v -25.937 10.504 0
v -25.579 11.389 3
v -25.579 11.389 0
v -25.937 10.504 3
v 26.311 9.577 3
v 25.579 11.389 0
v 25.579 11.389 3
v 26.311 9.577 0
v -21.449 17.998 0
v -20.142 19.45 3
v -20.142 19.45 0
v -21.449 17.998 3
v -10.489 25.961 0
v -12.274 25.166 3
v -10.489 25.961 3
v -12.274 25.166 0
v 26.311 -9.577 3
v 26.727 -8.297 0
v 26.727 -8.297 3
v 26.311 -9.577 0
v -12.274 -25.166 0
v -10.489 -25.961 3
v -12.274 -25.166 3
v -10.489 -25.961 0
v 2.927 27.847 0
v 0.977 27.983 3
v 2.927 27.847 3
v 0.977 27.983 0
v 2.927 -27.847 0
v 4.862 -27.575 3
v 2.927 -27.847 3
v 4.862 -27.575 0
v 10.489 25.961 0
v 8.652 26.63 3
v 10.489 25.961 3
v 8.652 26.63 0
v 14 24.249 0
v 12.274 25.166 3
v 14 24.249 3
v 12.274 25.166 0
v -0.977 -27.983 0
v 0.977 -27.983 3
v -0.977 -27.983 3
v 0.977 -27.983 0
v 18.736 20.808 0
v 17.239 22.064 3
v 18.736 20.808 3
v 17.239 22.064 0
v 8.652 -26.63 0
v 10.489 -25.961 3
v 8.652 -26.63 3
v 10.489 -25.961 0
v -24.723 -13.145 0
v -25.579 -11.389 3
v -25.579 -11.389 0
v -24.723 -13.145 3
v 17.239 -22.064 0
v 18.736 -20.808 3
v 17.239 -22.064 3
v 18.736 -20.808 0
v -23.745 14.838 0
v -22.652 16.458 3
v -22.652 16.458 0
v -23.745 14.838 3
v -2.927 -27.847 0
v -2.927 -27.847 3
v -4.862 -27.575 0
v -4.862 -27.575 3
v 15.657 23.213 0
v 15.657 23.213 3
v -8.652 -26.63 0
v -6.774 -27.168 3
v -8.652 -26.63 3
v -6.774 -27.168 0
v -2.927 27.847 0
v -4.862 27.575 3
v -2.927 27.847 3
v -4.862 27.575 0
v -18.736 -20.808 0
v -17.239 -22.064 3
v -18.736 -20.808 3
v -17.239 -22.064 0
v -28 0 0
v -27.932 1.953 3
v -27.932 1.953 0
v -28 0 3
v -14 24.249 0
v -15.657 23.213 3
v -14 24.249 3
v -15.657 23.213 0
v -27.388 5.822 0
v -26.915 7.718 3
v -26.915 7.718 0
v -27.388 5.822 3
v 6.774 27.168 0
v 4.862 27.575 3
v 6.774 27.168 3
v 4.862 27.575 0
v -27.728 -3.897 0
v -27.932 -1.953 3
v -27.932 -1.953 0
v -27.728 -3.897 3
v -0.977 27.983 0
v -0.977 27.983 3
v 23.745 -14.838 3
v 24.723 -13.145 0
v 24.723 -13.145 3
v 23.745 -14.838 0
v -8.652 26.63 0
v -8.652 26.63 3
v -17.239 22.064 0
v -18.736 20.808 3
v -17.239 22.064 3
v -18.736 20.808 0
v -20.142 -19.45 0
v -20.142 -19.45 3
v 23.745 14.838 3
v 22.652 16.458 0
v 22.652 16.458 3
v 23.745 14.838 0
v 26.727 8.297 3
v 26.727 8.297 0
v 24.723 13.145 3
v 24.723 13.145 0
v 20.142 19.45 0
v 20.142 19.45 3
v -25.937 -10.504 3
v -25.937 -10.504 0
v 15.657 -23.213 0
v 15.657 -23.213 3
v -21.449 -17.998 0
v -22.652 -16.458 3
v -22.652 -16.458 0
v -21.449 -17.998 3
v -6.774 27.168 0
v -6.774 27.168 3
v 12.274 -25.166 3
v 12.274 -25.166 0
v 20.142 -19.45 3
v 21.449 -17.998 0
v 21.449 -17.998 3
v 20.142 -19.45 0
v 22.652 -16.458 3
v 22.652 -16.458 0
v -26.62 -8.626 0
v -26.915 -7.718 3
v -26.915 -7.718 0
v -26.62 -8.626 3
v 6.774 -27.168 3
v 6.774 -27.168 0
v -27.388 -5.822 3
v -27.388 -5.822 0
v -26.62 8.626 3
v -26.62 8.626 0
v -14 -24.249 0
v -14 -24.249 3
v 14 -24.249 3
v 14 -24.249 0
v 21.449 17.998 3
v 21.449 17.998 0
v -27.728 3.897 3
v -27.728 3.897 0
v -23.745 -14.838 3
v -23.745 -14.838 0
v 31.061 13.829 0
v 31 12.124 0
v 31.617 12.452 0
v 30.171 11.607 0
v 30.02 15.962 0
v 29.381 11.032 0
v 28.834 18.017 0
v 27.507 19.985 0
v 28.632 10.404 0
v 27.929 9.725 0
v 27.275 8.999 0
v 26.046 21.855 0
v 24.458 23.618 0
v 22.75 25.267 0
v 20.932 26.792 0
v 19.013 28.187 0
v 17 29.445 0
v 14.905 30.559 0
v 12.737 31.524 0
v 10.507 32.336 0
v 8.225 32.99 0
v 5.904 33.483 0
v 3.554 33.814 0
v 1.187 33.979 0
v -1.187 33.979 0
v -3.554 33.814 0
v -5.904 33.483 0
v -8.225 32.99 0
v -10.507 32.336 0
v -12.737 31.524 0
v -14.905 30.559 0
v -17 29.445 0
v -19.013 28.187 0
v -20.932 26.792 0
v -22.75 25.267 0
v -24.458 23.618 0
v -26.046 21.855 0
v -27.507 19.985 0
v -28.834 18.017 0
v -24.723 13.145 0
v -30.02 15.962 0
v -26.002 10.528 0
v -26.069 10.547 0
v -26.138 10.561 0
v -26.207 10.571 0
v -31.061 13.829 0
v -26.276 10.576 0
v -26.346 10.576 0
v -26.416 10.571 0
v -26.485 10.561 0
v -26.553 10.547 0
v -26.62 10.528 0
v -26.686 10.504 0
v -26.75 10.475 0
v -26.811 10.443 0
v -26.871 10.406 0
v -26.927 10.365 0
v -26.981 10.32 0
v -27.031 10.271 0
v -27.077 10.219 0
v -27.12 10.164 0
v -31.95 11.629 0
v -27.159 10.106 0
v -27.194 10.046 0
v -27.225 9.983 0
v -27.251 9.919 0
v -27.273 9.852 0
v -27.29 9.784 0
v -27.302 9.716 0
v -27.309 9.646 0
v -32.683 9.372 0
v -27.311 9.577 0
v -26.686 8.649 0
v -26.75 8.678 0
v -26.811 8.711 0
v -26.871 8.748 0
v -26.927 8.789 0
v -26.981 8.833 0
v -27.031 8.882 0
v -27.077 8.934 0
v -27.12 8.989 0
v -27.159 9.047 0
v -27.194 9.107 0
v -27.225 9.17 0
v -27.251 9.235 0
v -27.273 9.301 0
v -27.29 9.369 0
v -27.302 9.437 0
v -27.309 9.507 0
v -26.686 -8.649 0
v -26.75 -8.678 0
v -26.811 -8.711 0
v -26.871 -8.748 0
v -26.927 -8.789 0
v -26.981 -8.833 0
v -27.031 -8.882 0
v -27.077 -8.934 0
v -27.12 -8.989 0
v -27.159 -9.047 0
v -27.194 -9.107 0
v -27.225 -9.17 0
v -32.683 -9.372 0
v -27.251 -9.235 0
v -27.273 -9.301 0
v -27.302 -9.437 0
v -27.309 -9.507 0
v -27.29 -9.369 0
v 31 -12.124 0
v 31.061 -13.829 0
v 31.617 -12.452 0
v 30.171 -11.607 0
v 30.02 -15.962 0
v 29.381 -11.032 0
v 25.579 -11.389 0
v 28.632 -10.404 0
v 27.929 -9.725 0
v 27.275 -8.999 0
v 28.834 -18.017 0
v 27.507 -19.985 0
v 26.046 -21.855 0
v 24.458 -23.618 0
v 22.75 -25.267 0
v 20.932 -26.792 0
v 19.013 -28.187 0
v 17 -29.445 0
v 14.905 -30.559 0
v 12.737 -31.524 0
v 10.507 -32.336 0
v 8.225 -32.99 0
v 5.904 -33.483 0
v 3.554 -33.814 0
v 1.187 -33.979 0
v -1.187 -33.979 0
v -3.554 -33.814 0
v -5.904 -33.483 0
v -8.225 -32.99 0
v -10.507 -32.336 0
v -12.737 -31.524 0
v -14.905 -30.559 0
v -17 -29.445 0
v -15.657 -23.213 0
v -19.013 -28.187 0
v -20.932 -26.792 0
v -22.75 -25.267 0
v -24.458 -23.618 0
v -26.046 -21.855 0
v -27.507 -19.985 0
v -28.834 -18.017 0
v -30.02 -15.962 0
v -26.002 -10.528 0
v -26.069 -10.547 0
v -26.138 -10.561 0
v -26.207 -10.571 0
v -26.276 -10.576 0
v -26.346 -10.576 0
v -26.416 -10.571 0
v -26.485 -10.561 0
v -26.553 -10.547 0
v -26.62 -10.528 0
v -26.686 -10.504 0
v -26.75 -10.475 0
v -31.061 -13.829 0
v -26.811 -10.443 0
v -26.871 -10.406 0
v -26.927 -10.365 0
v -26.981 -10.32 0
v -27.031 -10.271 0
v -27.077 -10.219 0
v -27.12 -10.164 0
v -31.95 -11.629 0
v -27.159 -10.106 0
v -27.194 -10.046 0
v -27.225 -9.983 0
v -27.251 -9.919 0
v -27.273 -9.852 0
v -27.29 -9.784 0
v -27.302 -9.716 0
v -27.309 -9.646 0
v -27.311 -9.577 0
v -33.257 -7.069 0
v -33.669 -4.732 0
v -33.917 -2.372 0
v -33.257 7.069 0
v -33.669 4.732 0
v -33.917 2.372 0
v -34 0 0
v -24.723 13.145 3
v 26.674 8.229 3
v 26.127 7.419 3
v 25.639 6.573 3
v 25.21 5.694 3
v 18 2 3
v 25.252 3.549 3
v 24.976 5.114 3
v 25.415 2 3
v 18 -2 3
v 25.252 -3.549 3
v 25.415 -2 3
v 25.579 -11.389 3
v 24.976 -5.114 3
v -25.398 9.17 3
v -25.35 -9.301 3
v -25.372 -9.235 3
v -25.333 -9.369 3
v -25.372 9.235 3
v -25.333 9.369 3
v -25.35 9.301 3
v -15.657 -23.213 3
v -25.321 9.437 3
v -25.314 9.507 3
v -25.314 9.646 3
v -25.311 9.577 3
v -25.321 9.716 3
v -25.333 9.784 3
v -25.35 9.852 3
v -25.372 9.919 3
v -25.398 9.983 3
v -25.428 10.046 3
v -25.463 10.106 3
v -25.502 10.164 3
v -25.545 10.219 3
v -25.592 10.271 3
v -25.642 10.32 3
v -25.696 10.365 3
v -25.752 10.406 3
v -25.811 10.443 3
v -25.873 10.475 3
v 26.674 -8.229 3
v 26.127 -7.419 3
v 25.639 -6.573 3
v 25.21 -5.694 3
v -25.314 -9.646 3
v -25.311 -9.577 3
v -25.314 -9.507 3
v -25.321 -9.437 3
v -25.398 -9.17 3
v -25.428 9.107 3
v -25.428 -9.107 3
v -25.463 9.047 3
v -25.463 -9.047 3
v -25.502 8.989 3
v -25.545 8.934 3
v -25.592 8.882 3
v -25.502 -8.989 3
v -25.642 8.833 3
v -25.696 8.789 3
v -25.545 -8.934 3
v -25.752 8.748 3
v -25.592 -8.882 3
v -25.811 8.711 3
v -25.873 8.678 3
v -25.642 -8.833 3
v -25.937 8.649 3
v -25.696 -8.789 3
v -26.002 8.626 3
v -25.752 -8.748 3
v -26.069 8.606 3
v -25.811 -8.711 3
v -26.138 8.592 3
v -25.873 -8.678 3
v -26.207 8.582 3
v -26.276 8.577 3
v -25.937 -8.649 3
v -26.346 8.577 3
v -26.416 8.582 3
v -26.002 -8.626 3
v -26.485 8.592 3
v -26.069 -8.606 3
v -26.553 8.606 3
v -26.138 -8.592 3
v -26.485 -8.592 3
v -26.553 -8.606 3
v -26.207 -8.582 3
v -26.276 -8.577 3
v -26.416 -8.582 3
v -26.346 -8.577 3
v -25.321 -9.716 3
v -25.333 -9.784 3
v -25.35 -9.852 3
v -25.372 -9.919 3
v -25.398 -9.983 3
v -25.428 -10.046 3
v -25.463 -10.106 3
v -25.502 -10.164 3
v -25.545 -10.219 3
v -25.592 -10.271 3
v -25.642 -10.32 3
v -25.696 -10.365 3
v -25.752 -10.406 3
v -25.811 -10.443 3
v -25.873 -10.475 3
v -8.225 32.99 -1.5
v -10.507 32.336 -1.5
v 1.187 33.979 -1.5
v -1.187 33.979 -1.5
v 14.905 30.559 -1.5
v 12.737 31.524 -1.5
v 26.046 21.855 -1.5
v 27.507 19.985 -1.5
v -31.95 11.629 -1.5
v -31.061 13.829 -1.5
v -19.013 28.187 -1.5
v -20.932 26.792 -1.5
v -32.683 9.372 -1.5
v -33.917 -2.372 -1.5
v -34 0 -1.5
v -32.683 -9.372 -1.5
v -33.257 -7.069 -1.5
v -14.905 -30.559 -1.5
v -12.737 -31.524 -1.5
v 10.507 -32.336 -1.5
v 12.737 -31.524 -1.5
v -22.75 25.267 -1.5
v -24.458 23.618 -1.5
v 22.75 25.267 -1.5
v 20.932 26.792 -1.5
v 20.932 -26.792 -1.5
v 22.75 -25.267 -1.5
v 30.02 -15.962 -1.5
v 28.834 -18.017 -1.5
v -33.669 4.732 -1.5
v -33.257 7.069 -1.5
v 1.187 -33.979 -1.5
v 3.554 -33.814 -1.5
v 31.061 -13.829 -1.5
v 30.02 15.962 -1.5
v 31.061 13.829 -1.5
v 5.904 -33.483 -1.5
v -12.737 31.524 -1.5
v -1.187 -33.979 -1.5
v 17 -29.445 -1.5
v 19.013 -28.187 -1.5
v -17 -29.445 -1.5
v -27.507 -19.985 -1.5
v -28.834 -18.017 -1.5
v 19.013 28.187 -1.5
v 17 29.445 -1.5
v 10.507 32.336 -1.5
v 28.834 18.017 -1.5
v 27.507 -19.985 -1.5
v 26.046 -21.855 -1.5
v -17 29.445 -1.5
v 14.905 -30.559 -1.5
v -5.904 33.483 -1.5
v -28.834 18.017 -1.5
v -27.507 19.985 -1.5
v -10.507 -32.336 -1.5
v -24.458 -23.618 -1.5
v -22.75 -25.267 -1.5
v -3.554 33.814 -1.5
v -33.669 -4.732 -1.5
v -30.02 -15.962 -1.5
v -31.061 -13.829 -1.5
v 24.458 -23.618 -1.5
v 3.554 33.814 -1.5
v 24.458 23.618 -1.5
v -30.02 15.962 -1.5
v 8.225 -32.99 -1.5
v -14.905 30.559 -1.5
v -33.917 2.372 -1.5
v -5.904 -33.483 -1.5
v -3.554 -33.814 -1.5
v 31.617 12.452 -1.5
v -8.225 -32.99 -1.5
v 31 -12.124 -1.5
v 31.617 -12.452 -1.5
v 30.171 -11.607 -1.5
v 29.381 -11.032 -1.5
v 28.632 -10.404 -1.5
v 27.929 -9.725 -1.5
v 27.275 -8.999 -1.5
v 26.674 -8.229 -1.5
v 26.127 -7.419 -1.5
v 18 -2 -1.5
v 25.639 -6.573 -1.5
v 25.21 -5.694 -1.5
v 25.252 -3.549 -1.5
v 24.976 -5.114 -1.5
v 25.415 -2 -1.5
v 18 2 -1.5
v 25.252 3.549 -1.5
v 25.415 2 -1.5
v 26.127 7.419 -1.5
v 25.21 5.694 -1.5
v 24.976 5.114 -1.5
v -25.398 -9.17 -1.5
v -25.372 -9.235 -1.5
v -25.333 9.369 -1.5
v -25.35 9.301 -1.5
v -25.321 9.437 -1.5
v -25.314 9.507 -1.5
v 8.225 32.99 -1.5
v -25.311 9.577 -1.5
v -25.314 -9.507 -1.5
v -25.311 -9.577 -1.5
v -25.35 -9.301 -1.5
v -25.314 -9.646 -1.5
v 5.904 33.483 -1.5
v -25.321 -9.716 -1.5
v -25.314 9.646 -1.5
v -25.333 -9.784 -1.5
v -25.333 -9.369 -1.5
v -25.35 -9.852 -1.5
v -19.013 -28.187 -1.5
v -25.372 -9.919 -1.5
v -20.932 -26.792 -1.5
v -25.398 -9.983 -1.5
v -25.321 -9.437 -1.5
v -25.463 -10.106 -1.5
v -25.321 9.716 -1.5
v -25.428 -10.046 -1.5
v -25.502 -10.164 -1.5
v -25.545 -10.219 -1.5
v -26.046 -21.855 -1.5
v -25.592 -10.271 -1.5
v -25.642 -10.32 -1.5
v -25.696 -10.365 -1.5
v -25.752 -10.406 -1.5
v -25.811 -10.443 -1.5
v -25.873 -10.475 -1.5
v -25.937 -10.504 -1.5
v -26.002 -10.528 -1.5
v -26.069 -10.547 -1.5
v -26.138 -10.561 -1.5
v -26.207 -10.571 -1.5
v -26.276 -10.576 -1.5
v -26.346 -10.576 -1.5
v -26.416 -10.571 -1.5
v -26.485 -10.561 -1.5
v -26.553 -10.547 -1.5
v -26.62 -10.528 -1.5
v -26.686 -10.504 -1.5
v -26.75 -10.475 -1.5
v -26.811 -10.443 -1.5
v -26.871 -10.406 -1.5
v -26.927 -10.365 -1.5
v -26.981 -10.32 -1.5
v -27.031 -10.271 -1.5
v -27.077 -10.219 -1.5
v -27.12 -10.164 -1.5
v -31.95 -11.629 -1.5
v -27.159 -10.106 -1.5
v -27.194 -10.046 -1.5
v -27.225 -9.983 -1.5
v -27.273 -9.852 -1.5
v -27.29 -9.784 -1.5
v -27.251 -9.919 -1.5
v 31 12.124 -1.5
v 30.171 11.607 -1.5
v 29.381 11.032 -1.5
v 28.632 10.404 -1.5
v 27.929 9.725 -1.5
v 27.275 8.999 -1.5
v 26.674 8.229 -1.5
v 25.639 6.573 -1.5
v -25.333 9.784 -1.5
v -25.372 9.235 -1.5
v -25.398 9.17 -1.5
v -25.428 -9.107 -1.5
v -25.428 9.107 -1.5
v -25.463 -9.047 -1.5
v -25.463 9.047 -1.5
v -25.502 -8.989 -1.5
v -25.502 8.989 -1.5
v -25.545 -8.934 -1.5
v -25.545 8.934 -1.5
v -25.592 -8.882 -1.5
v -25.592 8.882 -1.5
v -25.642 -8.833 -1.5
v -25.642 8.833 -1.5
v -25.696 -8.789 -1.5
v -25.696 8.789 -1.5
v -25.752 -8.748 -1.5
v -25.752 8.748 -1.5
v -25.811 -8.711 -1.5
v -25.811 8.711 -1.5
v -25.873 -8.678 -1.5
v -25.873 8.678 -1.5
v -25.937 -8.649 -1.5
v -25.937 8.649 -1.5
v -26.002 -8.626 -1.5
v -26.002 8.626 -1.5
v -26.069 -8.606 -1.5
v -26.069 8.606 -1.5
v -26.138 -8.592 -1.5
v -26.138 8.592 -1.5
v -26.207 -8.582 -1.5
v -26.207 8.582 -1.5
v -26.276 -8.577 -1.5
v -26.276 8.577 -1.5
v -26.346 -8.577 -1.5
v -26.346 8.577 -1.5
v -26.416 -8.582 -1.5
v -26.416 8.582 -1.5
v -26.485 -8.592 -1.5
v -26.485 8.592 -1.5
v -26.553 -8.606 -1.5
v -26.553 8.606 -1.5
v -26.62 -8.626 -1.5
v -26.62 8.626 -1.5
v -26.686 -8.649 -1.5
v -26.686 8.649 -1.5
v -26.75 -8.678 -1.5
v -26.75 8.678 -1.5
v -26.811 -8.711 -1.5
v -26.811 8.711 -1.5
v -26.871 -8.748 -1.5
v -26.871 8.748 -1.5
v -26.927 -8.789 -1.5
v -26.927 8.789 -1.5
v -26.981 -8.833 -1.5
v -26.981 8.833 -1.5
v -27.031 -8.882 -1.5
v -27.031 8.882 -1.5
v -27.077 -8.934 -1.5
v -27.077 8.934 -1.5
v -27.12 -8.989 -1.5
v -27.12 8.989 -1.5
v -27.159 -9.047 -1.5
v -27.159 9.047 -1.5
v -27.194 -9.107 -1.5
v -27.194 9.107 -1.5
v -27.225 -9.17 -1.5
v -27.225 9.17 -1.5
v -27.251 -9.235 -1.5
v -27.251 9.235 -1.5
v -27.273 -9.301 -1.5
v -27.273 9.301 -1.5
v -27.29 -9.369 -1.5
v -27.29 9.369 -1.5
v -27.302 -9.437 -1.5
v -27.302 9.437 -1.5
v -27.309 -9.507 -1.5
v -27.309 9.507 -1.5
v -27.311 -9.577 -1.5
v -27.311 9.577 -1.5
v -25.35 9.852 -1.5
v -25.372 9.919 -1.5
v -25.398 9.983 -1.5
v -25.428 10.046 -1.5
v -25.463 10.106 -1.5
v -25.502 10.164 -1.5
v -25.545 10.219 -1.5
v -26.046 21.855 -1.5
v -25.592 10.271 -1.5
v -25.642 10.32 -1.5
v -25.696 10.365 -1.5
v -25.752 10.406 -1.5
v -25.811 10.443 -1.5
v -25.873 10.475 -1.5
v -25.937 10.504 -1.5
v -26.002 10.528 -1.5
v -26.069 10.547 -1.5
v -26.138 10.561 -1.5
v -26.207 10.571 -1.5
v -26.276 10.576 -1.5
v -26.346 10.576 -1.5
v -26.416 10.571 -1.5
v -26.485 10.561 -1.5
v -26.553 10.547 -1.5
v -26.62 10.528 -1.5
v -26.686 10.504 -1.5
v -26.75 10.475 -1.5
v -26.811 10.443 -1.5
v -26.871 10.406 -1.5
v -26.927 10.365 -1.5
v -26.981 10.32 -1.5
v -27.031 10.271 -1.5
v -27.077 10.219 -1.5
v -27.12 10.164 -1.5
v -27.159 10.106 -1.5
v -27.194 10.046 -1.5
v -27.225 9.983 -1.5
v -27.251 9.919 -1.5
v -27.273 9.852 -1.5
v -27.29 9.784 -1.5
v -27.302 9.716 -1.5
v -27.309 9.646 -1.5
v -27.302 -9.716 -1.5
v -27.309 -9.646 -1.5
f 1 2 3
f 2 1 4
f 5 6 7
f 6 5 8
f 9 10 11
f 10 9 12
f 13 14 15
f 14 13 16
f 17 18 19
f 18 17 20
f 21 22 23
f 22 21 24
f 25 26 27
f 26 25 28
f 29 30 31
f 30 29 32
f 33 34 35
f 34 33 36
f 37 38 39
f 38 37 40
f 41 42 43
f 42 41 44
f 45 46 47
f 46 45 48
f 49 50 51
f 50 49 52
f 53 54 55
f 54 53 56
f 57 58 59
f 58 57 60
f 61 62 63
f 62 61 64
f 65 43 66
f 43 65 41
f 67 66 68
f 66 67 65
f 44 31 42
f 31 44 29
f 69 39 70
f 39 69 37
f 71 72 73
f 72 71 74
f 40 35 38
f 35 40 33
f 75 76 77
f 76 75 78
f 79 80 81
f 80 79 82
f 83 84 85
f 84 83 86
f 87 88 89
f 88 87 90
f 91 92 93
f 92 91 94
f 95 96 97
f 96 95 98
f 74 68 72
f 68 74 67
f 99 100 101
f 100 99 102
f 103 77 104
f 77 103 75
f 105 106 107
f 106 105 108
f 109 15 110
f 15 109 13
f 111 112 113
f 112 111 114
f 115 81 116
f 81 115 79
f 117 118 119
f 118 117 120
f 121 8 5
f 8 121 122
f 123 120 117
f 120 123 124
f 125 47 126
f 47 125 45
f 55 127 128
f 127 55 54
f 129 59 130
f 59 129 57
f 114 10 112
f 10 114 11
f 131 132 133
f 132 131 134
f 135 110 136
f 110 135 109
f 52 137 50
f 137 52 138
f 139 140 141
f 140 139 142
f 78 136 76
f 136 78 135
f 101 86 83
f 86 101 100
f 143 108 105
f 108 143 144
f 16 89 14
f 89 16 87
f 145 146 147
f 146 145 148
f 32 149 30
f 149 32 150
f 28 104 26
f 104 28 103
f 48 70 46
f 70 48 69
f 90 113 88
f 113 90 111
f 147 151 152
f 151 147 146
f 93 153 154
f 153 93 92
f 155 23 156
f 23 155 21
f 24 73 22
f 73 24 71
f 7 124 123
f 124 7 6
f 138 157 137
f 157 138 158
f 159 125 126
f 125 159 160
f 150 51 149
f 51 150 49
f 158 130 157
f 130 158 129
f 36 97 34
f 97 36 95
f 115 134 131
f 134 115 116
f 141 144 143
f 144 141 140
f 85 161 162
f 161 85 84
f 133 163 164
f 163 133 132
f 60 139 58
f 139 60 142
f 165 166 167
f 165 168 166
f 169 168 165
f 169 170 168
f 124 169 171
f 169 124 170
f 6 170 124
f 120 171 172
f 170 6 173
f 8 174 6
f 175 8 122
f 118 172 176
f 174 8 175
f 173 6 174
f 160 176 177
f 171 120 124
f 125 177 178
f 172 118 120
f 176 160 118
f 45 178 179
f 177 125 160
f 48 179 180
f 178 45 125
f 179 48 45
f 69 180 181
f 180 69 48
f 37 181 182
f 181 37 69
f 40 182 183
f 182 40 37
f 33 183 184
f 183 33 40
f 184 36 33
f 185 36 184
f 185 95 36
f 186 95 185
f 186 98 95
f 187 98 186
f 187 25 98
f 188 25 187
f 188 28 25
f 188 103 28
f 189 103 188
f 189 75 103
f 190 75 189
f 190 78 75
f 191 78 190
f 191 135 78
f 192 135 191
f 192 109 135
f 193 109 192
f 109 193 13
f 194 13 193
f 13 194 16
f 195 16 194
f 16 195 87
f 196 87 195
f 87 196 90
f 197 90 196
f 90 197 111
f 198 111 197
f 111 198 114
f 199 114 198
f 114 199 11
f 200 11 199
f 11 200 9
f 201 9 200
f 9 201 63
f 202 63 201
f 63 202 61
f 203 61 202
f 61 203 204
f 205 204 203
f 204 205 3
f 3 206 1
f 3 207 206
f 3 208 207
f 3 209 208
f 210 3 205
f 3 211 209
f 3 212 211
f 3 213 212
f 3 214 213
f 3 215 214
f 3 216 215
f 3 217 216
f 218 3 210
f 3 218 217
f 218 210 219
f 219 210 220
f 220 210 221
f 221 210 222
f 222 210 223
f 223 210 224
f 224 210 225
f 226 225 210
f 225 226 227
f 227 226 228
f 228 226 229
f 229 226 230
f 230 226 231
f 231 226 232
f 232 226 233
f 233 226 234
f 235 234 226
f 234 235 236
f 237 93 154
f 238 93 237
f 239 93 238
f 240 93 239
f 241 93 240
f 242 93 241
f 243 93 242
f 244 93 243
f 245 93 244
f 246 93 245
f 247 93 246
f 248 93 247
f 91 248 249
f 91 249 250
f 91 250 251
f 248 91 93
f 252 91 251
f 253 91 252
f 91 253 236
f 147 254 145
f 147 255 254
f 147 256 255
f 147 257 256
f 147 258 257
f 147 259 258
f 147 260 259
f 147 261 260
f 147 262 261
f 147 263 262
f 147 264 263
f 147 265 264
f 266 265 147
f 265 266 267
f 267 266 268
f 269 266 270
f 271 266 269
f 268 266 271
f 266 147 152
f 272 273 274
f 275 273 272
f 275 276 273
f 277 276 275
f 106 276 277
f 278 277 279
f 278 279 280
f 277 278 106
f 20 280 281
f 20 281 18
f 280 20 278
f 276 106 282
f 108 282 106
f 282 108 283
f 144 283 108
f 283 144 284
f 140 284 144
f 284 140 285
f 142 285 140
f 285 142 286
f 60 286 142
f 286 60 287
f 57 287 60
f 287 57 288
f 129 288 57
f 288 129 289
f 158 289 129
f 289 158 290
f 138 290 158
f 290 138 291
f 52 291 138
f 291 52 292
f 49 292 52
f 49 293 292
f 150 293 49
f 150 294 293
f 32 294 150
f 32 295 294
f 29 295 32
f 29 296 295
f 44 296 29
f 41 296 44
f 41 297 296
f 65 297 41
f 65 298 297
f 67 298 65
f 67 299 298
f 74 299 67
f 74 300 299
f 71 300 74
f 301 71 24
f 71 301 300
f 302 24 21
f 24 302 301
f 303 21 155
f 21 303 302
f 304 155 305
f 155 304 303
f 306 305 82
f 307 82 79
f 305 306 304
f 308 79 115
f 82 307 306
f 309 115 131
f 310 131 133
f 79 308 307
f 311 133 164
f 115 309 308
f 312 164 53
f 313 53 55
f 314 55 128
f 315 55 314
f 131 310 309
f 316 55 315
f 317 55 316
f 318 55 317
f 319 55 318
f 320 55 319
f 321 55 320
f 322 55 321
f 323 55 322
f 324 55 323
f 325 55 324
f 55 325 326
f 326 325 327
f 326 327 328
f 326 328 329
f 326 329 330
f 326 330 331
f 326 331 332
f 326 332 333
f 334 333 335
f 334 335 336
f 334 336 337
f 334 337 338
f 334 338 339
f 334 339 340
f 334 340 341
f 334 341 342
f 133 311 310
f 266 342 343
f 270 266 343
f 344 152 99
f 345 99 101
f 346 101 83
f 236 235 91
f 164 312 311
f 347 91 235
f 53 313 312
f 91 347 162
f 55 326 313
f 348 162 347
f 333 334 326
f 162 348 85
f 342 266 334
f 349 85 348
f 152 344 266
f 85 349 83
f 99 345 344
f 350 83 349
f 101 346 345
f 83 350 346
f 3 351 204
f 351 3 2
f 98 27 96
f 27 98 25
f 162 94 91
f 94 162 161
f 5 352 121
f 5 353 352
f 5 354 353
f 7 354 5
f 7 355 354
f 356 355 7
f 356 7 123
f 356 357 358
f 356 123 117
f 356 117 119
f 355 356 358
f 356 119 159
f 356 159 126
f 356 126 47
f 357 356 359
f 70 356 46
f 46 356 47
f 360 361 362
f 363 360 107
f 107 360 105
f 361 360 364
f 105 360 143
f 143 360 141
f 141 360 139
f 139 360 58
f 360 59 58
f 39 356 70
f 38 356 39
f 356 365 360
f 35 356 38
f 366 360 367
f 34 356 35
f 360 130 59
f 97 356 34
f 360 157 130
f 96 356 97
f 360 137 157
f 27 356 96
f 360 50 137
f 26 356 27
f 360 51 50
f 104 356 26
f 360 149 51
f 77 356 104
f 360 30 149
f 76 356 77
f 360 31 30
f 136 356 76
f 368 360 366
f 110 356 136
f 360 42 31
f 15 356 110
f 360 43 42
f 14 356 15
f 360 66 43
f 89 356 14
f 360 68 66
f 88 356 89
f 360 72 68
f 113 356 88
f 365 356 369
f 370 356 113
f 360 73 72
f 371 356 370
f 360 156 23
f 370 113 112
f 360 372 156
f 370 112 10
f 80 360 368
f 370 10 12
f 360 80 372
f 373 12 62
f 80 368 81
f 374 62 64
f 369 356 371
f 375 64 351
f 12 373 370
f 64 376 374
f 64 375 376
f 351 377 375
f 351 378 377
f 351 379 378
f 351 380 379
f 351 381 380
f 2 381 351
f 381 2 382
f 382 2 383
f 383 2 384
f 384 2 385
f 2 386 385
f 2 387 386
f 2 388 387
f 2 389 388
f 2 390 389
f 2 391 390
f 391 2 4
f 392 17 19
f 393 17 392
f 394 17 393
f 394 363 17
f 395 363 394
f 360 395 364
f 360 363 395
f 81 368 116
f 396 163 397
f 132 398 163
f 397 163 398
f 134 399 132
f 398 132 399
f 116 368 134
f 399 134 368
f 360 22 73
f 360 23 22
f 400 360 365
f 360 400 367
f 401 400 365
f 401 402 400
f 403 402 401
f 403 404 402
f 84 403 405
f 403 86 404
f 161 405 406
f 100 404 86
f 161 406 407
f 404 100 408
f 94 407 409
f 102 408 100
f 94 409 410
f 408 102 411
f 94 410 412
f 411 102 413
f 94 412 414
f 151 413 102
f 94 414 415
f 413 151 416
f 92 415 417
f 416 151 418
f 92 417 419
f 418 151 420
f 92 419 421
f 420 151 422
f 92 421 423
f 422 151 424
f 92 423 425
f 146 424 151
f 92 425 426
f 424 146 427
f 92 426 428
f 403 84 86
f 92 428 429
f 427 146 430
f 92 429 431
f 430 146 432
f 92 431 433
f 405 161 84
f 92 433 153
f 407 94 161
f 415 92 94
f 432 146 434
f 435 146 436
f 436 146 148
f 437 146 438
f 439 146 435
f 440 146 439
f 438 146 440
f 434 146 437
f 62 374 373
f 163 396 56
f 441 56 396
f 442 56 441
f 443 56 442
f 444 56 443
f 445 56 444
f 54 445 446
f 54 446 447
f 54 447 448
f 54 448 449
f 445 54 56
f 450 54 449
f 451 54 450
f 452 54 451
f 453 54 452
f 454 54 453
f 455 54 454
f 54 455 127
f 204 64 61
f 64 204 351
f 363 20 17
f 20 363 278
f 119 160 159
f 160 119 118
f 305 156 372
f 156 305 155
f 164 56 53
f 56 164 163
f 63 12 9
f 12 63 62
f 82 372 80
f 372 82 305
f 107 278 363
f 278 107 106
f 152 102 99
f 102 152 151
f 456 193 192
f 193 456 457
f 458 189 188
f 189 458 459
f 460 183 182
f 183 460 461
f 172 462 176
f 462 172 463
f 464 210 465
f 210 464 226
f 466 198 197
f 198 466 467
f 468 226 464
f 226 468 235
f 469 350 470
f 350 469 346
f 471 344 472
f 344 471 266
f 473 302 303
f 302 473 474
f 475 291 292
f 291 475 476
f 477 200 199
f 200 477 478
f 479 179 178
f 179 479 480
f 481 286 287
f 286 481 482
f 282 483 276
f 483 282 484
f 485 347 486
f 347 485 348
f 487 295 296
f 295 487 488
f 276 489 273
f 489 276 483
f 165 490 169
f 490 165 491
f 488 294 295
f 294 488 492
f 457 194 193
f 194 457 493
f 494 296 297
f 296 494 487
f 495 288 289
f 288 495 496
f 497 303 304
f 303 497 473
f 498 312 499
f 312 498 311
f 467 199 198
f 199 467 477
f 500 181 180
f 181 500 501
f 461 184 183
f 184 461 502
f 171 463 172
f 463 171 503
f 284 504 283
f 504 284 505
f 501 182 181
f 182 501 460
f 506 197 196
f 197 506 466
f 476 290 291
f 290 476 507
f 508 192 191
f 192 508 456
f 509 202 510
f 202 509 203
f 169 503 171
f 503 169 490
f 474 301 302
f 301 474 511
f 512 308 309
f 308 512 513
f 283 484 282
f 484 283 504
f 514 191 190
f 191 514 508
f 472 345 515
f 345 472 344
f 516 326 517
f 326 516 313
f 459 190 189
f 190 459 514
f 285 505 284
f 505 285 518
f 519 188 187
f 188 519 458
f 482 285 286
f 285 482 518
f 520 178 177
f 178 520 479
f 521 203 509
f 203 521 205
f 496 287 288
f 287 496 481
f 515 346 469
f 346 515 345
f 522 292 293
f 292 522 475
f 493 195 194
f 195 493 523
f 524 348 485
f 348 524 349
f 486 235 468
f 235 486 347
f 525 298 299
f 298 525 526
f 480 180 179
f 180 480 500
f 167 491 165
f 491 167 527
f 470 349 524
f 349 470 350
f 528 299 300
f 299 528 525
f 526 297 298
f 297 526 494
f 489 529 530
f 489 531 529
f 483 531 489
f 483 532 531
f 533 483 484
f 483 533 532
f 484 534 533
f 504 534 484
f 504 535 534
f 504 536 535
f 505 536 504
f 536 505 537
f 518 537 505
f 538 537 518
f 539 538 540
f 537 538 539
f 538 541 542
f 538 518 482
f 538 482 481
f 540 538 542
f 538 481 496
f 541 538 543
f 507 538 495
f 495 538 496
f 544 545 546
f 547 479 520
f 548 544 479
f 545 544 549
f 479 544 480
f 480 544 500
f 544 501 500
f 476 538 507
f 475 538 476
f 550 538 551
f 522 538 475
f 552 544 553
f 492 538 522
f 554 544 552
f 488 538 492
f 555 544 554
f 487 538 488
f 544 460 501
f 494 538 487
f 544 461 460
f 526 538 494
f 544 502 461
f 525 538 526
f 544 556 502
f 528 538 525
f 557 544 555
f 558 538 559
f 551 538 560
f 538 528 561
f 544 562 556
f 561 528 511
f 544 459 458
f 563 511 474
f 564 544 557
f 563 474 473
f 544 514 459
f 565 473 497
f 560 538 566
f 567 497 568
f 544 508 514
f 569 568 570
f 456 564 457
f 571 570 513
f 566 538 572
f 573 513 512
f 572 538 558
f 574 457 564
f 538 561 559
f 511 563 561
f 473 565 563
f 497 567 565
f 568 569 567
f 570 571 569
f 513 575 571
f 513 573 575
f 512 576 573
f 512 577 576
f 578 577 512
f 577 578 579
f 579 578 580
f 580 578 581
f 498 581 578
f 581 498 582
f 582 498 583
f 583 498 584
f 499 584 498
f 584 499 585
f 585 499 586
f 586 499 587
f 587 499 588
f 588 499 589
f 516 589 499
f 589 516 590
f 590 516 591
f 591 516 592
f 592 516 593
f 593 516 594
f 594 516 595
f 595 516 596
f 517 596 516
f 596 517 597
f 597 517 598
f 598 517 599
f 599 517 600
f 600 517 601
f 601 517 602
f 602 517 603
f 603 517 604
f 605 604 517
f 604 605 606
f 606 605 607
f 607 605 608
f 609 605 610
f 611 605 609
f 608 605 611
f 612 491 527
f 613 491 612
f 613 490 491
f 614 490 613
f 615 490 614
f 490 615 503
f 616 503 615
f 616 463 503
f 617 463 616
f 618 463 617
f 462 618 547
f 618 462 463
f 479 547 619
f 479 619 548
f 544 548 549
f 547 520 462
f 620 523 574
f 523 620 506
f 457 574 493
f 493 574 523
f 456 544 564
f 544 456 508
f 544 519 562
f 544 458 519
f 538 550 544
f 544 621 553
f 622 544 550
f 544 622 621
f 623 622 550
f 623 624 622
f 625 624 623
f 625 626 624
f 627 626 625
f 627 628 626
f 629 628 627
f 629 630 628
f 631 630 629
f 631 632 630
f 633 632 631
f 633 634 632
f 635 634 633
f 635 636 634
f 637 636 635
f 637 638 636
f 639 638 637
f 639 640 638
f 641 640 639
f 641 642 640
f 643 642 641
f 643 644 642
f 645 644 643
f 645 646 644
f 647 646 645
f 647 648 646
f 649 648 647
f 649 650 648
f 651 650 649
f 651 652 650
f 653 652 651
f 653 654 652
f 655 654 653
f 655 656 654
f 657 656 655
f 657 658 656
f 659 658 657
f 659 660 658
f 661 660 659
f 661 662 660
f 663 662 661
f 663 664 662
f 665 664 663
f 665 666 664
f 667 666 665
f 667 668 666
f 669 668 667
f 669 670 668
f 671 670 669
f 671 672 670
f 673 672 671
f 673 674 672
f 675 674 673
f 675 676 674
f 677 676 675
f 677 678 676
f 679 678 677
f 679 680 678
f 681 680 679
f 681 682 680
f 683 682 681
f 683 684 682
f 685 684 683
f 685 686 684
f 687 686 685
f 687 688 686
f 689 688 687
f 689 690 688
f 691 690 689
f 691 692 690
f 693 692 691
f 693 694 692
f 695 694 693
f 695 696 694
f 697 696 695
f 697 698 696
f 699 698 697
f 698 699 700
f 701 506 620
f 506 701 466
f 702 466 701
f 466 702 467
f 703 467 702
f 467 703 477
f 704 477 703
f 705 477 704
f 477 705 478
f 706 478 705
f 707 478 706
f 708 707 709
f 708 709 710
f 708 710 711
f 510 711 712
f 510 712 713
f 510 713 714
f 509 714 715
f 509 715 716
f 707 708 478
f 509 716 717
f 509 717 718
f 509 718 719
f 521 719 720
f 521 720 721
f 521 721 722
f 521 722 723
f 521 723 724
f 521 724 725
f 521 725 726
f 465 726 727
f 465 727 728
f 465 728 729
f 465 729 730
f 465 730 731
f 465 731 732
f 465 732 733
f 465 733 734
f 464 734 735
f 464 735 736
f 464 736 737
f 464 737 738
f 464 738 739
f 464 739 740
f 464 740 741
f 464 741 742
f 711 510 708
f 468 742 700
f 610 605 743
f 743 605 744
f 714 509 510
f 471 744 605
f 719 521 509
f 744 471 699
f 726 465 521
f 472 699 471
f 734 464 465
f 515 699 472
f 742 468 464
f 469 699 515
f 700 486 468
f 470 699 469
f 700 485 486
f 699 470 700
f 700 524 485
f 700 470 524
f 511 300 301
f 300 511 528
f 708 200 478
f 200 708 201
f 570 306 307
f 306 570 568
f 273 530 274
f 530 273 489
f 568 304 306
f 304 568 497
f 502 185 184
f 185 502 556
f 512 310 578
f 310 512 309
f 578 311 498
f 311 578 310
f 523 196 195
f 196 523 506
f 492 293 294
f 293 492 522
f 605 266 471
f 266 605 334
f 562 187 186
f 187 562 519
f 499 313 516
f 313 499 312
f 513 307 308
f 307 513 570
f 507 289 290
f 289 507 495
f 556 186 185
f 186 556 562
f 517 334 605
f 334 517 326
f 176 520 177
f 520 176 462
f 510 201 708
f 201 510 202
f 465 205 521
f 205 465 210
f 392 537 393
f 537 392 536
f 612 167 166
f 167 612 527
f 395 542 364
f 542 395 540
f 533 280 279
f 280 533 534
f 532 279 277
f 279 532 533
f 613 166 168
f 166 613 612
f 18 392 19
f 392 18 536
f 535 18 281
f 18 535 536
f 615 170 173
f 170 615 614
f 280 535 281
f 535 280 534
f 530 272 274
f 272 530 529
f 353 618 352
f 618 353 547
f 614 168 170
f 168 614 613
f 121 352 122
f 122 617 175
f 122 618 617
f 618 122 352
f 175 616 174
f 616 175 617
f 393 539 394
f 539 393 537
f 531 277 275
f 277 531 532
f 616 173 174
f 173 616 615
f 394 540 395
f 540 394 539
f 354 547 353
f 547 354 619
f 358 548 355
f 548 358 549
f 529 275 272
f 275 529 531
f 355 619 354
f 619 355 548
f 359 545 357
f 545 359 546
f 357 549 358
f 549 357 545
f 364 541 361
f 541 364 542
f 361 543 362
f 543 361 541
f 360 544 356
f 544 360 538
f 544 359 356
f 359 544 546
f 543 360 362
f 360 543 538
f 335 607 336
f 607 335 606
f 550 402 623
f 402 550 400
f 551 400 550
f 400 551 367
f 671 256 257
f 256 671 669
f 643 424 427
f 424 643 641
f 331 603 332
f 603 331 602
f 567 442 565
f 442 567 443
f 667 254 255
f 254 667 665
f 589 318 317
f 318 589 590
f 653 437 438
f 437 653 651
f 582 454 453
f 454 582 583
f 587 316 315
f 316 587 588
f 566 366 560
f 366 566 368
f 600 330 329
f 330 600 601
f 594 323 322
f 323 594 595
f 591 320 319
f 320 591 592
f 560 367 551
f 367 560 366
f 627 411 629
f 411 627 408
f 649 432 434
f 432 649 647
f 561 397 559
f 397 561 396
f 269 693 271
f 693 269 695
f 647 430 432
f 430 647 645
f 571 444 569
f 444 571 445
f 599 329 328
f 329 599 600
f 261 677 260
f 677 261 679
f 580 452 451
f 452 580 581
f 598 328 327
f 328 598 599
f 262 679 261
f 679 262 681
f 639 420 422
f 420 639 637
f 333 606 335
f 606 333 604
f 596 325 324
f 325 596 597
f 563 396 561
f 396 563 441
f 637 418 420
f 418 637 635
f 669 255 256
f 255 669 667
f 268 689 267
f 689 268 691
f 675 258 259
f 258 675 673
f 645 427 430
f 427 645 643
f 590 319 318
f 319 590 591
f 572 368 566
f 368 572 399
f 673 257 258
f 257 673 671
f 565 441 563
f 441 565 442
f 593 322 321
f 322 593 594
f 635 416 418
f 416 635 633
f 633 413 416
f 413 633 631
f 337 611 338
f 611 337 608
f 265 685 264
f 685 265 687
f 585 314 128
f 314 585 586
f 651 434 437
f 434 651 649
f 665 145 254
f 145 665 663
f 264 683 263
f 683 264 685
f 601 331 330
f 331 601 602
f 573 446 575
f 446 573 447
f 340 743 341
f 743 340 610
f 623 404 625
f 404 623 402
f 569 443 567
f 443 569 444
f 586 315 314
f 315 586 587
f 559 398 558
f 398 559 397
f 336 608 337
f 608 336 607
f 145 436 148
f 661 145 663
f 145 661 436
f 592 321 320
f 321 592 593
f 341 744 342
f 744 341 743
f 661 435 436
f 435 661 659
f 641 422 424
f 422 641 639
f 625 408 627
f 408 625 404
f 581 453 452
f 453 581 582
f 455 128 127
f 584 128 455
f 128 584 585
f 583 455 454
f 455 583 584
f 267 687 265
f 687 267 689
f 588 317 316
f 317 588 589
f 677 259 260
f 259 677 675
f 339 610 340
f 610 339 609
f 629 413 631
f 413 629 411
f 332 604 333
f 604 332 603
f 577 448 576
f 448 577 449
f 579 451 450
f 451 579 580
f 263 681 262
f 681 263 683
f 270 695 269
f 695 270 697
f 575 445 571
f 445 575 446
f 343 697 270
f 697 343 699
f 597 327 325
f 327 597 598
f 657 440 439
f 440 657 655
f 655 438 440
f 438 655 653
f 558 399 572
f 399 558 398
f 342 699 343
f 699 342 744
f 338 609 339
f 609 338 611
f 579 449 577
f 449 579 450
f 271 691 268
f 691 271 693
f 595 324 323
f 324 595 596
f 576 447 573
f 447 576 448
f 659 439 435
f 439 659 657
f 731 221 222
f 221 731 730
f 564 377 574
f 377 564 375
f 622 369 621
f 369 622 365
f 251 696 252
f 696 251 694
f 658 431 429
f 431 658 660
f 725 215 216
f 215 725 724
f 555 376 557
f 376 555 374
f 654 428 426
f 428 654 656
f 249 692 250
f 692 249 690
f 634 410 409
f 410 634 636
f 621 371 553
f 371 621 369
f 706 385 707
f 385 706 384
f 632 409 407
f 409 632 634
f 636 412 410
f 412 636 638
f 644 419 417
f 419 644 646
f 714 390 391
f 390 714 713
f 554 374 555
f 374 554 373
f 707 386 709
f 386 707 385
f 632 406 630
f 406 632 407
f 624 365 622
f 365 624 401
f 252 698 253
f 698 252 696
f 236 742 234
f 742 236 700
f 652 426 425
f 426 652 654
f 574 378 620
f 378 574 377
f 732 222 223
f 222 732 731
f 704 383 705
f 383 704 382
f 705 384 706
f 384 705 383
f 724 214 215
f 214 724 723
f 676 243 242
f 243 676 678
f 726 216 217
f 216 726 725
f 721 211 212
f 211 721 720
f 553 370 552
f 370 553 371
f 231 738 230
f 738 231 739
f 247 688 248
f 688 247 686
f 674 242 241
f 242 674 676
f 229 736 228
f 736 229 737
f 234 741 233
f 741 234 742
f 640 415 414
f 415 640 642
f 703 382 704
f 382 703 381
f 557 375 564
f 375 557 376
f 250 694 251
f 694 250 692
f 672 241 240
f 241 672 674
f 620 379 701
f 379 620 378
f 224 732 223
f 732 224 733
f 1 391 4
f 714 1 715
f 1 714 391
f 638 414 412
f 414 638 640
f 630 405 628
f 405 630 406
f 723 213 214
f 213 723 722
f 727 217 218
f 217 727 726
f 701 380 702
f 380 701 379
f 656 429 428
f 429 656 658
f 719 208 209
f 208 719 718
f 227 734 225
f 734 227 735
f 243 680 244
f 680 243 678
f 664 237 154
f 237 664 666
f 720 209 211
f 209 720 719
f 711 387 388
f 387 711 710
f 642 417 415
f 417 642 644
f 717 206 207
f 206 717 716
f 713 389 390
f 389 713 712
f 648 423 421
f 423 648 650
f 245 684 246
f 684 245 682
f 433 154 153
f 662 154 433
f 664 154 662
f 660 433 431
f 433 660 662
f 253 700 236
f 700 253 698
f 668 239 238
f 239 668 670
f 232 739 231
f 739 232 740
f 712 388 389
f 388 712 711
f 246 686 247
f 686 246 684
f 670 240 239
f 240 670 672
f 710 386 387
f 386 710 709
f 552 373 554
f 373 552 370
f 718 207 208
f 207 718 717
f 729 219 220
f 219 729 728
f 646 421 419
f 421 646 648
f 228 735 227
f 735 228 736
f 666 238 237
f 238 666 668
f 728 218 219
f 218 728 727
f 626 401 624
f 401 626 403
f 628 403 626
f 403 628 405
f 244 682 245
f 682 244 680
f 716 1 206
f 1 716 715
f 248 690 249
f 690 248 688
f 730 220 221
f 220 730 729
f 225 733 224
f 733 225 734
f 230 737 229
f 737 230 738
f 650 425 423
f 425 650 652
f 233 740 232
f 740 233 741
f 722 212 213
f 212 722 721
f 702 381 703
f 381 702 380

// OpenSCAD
dInnen=56;
dAussen=68;
h1=3;
h2=1.5;
$fn=90;




difference() {
    union() {
        cylinder(d=dInnen, h=h1);
        
        translate([0,0,-h2])
        cylinder(d=dAussen, h=h2);
    }
    
    //Halbmond
    difference() {
        translate ([dInnen-18, 0, -10])
        cylinder(d=dInnen/2, h=20);
        
        translate([0,0,-h2])
        cylinder(d=dInnen-5, h=h1+h2);
    }
    
    //Schlitz
    translate ([dInnen/2-10, -2, -10])
    cube([40,4,20]);

    //Luftloch
    rotate([0,0,20])
    translate ([-dInnen/2, 0, -10])
    cylinder(d=2, h=20);
 
    rotate([0,0,-20])
    translate ([-dInnen/2, 0, -10])
    cylinder(d=2, h=20);
}
